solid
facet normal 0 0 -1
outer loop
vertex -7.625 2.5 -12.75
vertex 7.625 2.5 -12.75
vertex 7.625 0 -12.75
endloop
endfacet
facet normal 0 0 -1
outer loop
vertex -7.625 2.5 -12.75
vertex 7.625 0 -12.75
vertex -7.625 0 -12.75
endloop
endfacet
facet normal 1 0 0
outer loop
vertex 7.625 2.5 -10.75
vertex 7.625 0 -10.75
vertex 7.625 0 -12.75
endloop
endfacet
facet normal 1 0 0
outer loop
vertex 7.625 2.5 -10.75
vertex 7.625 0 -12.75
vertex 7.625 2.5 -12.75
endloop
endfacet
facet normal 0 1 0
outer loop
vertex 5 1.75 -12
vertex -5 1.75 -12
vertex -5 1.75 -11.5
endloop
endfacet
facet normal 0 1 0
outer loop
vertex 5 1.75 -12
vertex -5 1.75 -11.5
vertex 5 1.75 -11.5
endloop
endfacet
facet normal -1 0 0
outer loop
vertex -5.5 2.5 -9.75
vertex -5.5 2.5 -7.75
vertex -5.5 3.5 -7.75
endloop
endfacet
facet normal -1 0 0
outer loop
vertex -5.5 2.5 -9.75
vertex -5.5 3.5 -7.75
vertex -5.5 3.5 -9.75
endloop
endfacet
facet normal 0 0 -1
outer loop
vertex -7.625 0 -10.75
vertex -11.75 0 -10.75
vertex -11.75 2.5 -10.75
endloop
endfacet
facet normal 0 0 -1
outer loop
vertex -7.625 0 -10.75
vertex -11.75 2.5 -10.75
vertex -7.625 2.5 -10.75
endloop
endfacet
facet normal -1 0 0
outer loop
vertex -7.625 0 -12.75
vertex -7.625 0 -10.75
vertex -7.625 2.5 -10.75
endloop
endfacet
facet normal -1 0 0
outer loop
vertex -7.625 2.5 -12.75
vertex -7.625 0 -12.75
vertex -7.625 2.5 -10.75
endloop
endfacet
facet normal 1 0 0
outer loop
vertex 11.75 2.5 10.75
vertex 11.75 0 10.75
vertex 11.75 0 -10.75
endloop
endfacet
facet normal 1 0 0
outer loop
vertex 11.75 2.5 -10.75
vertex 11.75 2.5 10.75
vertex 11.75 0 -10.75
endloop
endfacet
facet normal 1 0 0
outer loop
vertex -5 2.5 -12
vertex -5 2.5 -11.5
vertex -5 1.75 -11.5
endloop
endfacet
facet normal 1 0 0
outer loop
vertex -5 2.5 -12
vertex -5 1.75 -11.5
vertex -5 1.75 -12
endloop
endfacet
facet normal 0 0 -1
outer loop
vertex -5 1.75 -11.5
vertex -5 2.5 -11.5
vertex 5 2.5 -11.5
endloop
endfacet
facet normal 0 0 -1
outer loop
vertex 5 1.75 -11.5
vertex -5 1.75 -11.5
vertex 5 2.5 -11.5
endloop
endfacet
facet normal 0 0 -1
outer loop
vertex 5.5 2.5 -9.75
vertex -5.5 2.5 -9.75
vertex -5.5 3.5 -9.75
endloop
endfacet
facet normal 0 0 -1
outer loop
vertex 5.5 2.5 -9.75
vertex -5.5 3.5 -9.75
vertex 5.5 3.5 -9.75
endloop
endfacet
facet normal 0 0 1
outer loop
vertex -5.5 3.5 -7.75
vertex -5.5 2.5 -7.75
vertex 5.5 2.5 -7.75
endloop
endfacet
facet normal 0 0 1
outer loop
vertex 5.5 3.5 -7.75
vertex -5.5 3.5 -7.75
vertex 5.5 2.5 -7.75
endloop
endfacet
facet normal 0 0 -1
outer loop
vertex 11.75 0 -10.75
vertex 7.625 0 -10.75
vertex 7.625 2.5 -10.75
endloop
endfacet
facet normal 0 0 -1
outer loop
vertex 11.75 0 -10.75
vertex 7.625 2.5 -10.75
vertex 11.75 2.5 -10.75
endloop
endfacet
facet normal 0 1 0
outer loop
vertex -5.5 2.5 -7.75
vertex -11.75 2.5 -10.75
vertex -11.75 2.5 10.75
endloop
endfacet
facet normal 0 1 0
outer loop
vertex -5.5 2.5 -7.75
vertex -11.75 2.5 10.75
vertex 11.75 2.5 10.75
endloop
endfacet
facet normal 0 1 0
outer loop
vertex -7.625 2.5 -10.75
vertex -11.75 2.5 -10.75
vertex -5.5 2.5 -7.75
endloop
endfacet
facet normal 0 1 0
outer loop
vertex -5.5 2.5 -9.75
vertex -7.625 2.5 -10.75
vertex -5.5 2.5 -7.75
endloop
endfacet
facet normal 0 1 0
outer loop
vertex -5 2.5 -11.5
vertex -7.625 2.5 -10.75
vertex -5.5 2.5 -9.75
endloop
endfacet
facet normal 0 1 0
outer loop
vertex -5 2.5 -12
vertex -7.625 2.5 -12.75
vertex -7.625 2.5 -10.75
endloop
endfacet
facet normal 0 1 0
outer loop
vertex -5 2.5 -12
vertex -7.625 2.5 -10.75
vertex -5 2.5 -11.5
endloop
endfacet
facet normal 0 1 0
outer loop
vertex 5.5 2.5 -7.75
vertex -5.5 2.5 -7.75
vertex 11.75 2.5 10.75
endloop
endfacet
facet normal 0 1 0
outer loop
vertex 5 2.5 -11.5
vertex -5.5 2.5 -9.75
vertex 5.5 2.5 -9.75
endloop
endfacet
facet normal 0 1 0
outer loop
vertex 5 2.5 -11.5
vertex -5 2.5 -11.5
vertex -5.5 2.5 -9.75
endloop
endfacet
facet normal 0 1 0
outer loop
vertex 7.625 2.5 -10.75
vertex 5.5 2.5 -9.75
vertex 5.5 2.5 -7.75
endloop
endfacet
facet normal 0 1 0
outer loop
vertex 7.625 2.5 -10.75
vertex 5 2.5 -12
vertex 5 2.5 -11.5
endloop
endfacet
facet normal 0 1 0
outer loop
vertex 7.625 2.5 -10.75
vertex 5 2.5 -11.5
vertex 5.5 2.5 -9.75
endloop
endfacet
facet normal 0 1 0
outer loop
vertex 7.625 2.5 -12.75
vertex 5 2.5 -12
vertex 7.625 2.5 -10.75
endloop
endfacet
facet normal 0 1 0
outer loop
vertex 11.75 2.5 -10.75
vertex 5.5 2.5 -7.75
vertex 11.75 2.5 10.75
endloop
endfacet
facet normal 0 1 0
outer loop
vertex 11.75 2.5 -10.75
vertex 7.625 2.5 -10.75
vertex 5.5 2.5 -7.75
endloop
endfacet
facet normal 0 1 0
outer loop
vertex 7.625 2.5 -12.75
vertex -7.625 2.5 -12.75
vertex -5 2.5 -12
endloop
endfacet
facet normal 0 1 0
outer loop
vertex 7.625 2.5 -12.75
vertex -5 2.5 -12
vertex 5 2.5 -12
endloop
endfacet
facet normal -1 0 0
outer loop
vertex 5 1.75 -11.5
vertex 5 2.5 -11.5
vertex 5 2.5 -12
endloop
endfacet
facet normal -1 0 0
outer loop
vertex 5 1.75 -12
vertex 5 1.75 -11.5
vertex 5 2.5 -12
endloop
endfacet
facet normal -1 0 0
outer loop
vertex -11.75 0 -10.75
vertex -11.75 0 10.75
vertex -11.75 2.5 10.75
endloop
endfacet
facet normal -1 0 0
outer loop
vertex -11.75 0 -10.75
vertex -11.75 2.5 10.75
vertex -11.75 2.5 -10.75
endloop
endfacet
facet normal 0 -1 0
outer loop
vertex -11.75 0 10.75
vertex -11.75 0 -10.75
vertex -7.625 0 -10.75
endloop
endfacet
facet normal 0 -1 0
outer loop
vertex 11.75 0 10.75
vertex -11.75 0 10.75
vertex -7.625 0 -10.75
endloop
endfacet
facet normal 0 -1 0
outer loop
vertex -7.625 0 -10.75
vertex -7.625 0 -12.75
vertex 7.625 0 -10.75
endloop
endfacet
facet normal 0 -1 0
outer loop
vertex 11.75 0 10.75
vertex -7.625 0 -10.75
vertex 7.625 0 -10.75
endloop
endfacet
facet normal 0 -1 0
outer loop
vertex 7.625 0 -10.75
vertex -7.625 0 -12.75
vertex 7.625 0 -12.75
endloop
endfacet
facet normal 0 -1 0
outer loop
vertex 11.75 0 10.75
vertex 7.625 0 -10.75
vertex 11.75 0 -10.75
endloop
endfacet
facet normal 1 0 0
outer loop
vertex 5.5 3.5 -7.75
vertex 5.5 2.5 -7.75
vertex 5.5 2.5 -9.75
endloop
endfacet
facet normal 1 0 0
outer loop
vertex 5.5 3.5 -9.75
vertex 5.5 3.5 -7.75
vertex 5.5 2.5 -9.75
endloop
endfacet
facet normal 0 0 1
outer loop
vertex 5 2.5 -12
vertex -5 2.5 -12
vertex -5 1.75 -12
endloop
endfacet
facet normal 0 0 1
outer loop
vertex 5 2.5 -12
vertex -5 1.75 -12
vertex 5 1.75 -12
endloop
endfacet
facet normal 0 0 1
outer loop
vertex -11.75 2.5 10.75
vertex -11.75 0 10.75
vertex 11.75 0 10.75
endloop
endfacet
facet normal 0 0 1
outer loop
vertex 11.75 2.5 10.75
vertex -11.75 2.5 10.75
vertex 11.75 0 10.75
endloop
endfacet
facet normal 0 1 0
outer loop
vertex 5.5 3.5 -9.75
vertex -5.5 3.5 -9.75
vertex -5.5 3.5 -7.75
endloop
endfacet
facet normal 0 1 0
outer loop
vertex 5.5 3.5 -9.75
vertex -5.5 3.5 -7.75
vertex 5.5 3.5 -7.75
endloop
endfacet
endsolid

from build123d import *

# Parameters (mm, degrees)
CROQUIS1_W              = 23.5
CROQUIS1_H              = 21.5
SALIENTE_EXTRUIR1_DEPTH = 2.5
CROQUIS2_W              = 15.25
CROQUIS2_H              = 2.5
SALIENTE_EXTRUIR2_DEPTH = 2
CROQUIS4_W              = 11
CROQUIS4_H              = 2
SALIENTE_EXTRUIR4_DEPTH = 1
CROQUIS5_W              = 10
CROQUIS5_H              = 0.5
CORTAR_EXTRUIR1_DEPTH   = 0.75


with BuildPart() as part:
    # Croquis1 → Saliente-Extruir1 (new body)
    with BuildSketch(Plane(origin=(0, 0, 0), x_dir=(1, 0, 0), z_dir=(0, 1, 0))):
        Rectangle(CROQUIS1_W, CROQUIS1_H)
    extrude(amount=SALIENTE_EXTRUIR1_DEPTH)

    # Croquis2 → Saliente-Extruir2 (add)
    with BuildSketch(Plane(origin=(0, 0, -10.75), x_dir=(-1, 0, 0), z_dir=(0, 0, -1))):
        with Locations((0, 1.25)):
            Rectangle(CROQUIS2_W, CROQUIS2_H)
    extrude(amount=SALIENTE_EXTRUIR2_DEPTH)

    # Croquis4 → Saliente-Extruir4 (add)
    with BuildSketch(Plane(origin=(0, 2.5, 0), x_dir=(1, 0, 0), z_dir=(0, 1, 0))):
        with Locations((0, 8.75)):
            Rectangle(CROQUIS4_W, CROQUIS4_H)
    extrude(amount=SALIENTE_EXTRUIR4_DEPTH)

    # Croquis5 → Cortar-Extruir1 (cut)
    with BuildSketch(Plane(origin=(0, 2.5, 0), x_dir=(1, 0, 0), z_dir=(0, 1, 0))):
        with Locations((0, 11.75)):
            Rectangle(CROQUIS5_W, CROQUIS5_H)
    extrude(amount=-CORTAR_EXTRUIR1_DEPTH, mode=Mode.SUBTRACT)


solid = part.part
